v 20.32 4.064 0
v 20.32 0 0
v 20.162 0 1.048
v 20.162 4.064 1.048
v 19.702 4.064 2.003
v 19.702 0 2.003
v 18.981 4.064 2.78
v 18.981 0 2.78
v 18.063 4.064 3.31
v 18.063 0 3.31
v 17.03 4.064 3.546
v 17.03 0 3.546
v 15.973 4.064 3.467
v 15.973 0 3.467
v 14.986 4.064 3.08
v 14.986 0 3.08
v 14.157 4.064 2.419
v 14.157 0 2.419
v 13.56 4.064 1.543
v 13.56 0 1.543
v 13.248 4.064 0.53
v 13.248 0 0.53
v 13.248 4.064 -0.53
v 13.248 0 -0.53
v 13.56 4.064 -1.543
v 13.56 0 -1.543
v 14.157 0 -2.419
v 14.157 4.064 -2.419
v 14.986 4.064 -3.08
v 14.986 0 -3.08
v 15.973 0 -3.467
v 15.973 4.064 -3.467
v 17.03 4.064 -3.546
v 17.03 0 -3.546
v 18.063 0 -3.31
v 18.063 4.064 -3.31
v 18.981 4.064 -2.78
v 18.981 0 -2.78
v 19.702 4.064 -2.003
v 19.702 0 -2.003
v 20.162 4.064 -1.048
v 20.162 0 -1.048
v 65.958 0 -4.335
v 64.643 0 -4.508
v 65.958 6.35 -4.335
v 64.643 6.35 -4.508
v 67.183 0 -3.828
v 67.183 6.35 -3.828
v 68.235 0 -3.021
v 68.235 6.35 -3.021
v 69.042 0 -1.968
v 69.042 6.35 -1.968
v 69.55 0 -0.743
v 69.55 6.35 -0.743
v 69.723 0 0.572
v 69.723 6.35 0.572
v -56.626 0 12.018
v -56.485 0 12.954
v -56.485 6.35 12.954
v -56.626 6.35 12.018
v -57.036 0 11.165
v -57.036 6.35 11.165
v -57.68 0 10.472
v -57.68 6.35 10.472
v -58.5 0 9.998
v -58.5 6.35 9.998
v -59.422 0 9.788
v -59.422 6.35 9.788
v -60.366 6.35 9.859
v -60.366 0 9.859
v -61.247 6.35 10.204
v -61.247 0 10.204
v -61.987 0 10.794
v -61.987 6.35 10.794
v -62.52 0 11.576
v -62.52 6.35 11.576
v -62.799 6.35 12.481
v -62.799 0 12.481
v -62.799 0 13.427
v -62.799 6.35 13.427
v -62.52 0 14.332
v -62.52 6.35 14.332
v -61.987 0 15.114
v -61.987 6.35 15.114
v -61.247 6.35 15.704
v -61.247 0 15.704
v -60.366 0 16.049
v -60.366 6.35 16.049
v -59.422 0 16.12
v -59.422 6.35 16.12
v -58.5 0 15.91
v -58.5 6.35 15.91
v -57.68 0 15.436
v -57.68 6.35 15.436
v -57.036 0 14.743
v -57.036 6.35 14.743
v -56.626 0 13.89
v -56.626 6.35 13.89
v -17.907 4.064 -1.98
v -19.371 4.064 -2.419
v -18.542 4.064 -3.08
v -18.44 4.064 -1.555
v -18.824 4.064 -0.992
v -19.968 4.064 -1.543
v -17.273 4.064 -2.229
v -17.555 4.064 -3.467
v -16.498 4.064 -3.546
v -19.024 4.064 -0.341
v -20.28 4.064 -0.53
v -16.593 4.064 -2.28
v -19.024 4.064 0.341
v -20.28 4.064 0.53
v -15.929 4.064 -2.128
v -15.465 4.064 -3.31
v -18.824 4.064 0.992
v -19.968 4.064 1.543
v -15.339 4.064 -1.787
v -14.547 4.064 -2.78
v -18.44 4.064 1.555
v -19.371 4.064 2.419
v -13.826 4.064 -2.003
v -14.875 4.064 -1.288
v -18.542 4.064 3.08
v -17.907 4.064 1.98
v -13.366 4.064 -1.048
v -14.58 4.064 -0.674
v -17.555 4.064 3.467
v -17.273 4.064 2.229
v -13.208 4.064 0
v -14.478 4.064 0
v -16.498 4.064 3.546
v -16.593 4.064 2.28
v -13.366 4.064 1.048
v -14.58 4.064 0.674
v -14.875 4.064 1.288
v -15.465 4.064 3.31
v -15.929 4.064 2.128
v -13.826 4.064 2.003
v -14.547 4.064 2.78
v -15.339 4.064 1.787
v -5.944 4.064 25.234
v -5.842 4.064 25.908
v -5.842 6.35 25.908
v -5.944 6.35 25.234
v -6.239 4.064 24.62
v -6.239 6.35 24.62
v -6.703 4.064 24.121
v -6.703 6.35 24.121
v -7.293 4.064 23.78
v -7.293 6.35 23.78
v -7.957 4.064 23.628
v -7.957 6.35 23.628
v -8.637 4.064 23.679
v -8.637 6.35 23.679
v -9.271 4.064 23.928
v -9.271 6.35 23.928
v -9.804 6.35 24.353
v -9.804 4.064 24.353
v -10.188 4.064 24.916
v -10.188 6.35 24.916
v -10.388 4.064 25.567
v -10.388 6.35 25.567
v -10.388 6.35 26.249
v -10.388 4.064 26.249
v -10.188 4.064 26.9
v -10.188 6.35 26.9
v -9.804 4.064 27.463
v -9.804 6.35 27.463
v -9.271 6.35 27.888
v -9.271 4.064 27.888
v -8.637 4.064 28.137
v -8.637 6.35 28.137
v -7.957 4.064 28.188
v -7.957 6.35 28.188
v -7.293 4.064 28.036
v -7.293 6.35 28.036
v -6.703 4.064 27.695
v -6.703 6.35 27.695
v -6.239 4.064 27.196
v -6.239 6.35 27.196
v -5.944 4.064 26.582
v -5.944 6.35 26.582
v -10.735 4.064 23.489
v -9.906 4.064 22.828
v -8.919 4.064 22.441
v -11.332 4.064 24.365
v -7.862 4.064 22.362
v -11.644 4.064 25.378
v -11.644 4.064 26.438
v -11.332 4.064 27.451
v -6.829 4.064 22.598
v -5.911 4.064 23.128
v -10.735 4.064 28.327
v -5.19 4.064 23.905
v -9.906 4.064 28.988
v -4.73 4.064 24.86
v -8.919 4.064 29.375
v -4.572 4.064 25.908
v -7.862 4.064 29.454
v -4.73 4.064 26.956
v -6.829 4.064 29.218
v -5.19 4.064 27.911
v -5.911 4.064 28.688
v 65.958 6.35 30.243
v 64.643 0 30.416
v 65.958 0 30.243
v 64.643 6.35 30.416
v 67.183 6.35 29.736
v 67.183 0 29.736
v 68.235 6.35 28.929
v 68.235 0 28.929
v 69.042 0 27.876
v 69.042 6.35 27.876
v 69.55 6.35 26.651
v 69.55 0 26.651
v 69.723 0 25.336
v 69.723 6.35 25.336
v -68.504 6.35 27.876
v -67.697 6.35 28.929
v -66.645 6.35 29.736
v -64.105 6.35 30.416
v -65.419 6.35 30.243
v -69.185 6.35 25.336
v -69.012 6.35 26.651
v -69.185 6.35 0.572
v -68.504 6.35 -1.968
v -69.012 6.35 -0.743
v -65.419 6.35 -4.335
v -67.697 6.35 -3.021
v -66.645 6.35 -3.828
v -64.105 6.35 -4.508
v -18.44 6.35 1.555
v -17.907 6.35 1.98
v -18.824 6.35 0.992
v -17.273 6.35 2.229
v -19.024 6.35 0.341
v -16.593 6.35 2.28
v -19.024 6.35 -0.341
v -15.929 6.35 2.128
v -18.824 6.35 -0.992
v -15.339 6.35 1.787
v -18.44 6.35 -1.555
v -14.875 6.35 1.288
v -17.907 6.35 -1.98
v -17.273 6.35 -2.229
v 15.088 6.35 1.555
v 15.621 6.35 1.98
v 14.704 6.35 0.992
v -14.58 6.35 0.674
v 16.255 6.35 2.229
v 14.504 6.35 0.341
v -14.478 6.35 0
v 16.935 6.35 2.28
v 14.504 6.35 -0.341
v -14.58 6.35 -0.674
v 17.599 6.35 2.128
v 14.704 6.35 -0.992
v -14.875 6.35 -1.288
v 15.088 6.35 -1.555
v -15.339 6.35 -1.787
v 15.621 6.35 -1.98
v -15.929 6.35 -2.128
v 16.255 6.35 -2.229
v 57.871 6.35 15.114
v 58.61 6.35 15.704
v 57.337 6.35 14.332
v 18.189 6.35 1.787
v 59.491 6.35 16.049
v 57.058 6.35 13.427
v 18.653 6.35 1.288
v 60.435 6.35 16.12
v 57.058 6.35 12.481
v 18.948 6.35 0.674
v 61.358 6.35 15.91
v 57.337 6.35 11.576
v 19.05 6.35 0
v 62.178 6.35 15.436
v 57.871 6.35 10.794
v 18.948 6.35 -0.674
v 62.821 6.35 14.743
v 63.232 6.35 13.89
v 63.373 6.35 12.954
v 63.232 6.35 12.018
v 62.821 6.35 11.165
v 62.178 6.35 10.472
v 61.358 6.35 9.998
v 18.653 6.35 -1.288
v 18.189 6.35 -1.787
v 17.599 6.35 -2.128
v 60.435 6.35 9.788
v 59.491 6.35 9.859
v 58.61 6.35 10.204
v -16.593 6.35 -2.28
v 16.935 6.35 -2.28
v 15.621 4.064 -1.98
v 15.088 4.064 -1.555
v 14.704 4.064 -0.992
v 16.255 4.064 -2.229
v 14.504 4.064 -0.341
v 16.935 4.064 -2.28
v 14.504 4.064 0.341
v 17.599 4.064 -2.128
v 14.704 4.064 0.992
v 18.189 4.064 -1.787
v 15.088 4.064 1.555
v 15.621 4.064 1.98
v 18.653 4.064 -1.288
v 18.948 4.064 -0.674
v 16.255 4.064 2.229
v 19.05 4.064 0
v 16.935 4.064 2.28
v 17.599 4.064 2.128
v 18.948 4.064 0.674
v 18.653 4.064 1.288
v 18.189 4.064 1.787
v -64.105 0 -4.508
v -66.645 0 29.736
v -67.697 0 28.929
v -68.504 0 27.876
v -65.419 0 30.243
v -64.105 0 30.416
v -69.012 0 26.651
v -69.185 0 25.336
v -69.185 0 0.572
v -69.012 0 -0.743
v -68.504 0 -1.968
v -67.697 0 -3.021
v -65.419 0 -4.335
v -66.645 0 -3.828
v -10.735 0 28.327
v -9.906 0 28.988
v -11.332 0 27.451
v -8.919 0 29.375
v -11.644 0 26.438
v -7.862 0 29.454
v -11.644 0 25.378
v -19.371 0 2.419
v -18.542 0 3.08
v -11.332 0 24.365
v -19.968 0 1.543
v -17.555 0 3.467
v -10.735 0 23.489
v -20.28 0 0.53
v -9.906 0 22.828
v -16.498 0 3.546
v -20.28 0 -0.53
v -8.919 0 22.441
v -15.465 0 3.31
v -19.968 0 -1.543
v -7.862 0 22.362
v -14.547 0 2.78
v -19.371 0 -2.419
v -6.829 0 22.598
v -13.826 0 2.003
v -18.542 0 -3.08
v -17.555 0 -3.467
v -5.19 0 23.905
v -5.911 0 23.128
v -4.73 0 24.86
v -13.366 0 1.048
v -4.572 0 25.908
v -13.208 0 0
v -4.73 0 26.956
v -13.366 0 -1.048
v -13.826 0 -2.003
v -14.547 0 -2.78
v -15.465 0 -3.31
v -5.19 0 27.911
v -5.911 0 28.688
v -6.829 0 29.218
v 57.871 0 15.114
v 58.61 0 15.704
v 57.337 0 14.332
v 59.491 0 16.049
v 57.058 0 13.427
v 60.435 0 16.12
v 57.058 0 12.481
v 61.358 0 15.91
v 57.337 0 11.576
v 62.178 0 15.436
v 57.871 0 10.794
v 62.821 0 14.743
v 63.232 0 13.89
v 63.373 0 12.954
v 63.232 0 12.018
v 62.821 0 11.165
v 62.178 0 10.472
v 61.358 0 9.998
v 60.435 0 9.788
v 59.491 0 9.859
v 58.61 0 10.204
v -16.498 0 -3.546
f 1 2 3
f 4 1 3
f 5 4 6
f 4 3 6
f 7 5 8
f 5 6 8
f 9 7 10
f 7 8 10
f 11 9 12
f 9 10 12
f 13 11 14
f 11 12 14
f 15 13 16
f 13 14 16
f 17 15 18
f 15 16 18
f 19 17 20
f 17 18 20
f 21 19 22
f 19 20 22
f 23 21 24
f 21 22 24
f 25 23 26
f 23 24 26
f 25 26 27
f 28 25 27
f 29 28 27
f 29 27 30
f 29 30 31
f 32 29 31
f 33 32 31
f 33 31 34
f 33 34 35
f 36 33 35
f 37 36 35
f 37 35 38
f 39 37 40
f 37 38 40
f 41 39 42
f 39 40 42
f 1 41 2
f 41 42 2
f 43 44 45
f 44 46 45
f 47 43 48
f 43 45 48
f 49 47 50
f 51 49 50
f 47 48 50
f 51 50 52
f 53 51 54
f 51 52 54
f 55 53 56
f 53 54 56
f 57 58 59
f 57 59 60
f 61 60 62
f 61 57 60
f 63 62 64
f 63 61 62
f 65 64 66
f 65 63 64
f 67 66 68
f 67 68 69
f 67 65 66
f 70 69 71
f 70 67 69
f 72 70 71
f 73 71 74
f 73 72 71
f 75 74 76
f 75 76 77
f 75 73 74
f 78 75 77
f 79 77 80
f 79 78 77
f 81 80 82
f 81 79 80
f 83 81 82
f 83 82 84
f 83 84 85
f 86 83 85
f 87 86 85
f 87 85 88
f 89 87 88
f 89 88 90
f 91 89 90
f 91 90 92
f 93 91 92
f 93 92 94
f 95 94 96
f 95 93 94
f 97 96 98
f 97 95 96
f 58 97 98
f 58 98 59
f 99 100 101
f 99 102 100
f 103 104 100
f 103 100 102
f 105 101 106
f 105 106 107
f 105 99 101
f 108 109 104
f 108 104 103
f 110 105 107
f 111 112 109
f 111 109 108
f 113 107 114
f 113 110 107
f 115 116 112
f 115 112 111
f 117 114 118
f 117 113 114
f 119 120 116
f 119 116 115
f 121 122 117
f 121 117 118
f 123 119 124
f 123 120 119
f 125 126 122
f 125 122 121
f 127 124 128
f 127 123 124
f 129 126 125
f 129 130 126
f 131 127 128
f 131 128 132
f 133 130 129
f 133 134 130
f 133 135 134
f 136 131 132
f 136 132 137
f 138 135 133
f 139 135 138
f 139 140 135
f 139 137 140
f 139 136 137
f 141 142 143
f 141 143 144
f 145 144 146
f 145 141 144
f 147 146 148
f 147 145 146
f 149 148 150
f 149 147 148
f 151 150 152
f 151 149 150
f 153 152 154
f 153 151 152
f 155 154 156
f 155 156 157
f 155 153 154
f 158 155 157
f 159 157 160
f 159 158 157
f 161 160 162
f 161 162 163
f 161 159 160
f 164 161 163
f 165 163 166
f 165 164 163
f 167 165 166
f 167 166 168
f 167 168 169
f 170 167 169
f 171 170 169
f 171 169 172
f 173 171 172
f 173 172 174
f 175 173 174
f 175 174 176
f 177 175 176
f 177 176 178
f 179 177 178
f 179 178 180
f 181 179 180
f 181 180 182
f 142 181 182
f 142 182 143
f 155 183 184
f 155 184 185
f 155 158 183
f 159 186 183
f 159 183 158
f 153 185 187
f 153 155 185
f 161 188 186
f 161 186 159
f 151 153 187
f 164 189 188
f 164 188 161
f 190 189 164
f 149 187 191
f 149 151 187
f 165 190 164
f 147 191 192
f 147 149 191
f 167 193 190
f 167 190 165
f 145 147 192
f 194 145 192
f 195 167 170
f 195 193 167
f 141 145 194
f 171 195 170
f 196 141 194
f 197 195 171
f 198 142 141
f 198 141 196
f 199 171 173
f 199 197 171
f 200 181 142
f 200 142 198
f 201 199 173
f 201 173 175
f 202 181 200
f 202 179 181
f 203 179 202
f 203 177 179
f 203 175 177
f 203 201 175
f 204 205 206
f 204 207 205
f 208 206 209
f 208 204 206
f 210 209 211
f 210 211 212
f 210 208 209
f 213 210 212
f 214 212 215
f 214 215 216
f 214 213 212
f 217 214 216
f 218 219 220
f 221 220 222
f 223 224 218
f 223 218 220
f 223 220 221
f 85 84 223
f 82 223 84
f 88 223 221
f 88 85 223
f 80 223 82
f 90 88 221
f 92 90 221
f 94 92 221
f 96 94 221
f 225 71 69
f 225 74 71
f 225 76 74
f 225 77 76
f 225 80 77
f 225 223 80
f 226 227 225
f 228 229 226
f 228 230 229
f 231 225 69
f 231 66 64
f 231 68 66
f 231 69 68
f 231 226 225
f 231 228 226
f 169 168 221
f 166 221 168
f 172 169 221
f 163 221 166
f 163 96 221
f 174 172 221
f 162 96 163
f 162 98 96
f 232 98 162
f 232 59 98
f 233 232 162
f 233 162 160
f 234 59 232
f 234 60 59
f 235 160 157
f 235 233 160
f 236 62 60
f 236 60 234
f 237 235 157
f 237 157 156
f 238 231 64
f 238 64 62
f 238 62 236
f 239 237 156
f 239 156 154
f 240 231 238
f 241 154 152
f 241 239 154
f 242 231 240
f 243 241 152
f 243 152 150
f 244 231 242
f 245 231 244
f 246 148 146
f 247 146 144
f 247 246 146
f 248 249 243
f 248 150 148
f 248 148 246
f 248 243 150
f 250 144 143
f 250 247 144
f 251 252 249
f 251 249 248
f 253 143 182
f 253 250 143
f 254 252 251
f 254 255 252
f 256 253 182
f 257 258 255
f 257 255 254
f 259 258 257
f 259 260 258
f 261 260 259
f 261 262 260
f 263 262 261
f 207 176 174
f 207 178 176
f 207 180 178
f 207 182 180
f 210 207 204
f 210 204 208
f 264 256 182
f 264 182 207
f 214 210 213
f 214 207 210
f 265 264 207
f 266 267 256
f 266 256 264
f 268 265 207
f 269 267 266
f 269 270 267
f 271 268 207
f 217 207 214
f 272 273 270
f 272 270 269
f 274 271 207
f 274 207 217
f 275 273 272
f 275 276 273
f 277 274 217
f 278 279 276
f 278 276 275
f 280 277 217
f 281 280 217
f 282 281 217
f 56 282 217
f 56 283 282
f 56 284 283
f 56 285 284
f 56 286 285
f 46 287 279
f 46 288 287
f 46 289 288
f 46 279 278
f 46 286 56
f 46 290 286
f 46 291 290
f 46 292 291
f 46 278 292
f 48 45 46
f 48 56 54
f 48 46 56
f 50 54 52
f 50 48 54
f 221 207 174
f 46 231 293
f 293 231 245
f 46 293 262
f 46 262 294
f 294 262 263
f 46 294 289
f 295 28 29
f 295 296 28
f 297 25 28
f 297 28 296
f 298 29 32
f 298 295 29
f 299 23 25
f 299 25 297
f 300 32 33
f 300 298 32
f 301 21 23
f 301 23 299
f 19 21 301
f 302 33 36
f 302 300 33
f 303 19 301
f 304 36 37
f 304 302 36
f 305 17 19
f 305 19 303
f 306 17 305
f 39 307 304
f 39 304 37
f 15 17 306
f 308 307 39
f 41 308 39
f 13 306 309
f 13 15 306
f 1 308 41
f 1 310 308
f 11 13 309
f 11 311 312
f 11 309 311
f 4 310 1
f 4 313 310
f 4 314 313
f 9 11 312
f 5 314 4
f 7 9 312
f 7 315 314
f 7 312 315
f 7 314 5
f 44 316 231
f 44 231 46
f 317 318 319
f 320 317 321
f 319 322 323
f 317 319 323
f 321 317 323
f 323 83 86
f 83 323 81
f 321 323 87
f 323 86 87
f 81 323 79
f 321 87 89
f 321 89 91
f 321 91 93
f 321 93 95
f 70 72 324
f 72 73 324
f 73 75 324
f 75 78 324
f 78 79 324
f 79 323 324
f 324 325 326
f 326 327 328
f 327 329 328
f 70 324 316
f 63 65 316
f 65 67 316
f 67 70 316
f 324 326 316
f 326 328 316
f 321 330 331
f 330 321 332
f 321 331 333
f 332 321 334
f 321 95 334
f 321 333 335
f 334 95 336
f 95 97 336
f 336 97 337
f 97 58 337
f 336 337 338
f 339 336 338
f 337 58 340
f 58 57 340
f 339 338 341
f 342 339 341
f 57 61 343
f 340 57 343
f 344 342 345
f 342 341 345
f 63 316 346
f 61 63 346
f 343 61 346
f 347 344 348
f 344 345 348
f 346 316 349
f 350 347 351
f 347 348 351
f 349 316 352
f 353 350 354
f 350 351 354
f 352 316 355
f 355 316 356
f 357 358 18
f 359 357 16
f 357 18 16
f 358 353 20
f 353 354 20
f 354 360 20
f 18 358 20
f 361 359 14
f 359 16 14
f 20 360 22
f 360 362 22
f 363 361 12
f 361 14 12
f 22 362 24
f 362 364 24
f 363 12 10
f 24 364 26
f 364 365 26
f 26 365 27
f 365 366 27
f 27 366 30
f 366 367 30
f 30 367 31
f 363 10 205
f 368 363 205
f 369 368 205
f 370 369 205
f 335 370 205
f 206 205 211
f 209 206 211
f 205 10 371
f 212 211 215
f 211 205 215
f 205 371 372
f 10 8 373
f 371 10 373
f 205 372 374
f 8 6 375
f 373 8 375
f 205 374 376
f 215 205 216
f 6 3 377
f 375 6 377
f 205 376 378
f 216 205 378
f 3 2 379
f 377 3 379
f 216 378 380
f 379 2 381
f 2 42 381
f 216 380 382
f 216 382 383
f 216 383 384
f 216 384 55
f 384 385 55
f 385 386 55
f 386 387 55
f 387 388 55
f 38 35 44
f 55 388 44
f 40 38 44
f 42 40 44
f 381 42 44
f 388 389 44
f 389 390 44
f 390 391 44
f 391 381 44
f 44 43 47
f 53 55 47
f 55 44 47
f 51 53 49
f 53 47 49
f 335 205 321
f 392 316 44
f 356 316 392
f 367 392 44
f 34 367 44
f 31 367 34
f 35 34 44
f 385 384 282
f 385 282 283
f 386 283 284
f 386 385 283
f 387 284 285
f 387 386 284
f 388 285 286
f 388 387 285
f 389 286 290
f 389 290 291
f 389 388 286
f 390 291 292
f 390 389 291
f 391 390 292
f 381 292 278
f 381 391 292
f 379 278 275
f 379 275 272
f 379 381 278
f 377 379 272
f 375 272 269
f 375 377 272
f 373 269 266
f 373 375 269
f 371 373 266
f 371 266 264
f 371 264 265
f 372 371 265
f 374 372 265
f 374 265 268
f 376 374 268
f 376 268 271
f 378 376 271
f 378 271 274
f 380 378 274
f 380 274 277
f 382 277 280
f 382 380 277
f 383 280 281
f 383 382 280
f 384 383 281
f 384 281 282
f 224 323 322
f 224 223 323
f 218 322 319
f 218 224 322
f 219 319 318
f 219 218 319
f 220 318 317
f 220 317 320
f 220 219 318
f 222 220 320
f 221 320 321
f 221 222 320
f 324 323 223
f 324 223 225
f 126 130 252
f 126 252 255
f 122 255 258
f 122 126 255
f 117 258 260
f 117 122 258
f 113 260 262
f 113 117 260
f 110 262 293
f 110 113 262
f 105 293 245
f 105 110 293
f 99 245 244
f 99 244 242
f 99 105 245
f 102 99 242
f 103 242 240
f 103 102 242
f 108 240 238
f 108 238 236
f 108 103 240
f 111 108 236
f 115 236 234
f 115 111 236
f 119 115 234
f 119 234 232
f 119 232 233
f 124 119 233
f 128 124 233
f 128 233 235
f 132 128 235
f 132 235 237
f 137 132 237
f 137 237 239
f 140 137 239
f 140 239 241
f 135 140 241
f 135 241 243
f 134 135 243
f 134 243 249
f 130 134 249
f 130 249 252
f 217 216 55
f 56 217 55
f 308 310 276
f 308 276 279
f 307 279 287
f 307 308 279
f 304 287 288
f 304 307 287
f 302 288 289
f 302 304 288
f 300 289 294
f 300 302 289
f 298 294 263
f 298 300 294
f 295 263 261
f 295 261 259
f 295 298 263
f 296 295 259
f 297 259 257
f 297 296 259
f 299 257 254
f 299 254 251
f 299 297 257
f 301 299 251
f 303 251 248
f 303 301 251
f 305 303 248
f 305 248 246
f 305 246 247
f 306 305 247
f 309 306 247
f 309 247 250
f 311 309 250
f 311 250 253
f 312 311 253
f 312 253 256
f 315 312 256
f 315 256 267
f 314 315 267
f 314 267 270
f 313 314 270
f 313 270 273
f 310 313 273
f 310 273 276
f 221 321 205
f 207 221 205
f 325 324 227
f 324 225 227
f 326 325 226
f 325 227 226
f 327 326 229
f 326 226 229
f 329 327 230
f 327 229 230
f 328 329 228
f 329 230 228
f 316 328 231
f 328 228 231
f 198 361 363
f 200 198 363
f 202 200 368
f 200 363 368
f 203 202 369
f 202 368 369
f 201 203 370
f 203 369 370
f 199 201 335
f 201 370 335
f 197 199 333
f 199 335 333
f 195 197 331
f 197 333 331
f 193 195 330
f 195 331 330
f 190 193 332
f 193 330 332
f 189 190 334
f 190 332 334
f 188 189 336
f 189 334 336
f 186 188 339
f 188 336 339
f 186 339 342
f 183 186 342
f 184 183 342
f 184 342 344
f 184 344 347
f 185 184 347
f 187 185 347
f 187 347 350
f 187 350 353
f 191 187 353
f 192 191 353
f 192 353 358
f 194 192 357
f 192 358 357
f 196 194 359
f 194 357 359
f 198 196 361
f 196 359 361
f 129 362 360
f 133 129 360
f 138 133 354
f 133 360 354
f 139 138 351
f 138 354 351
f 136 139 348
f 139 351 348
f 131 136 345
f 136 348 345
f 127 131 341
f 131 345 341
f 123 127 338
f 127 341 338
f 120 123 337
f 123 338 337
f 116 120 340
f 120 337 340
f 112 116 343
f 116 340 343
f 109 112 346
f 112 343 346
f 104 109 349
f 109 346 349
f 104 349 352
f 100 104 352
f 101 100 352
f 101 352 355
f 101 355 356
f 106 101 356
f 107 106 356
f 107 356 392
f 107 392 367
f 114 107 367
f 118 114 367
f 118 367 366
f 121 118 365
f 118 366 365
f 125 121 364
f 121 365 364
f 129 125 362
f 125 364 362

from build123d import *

# Parameters (mm, degrees)
SKETCH1_W           = 138.907683808
SKETCH1_H           = 34.925
SKETCH1_R           = 2.286
SKETCH1_R_2         = 3.175
BOSS_EXTRUDE1_DEPTH = 6.35
SKETCH2_R           = 3.556
CUT_EXTRUDE1_DEPTH  = 4.064
FILLET1_R           = 5.08


with BuildPart() as part:
    # Sketch1 → Boss-Extrude1 (new body)
    with BuildSketch(Plane(origin=(0, 0, 0), x_dir=(1, 0, 0), z_dir=(0, 1, 0))):
        with Locations((0.269158096, -12.954)):
            Rectangle(SKETCH1_W, SKETCH1_H)
        with Locations((16.764, 0)):
            Circle(SKETCH1_R, mode=Mode.SUBTRACT)
        with Locations((-16.764, 0)):
            Circle(SKETCH1_R, mode=Mode.SUBTRACT)
        with Locations((-8.128, -25.908)):
            Circle(SKETCH1_R, mode=Mode.SUBTRACT)
        with Locations((60.198, -12.954)):
            Circle(SKETCH1_R_2, mode=Mode.SUBTRACT)
        with Locations((-59.659683808, -12.954)):
            Circle(SKETCH1_R_2, mode=Mode.SUBTRACT)
    extrude(amount=BOSS_EXTRUDE1_DEPTH)

    # Sketch2 → Cut-Extrude1 (cut)
    with BuildSketch(Plane.XZ):
        with Locations((-8.128, 25.908)):
            Circle(SKETCH2_R)
        with Locations((-16.764, 0)):
            Circle(SKETCH2_R)
        with Locations((16.764, 0)):
            Circle(SKETCH2_R)
    extrude(amount=-CUT_EXTRUDE1_DEPTH, mode=Mode.SUBTRACT)

    # Fillet1
    fillet1_edges = [part.edges().sort_by_distance(p)[0] for p in [
        (-69.184683808, 3.175, 30.4165),
        (-69.184683808, 3.175, -4.5085),
        (69.723, 3.175, -4.5085),
        (69.723, 3.175, 30.4165),
    ]]
    fillet(fillet1_edges, radius=FILLET1_R)


solid = part.part
